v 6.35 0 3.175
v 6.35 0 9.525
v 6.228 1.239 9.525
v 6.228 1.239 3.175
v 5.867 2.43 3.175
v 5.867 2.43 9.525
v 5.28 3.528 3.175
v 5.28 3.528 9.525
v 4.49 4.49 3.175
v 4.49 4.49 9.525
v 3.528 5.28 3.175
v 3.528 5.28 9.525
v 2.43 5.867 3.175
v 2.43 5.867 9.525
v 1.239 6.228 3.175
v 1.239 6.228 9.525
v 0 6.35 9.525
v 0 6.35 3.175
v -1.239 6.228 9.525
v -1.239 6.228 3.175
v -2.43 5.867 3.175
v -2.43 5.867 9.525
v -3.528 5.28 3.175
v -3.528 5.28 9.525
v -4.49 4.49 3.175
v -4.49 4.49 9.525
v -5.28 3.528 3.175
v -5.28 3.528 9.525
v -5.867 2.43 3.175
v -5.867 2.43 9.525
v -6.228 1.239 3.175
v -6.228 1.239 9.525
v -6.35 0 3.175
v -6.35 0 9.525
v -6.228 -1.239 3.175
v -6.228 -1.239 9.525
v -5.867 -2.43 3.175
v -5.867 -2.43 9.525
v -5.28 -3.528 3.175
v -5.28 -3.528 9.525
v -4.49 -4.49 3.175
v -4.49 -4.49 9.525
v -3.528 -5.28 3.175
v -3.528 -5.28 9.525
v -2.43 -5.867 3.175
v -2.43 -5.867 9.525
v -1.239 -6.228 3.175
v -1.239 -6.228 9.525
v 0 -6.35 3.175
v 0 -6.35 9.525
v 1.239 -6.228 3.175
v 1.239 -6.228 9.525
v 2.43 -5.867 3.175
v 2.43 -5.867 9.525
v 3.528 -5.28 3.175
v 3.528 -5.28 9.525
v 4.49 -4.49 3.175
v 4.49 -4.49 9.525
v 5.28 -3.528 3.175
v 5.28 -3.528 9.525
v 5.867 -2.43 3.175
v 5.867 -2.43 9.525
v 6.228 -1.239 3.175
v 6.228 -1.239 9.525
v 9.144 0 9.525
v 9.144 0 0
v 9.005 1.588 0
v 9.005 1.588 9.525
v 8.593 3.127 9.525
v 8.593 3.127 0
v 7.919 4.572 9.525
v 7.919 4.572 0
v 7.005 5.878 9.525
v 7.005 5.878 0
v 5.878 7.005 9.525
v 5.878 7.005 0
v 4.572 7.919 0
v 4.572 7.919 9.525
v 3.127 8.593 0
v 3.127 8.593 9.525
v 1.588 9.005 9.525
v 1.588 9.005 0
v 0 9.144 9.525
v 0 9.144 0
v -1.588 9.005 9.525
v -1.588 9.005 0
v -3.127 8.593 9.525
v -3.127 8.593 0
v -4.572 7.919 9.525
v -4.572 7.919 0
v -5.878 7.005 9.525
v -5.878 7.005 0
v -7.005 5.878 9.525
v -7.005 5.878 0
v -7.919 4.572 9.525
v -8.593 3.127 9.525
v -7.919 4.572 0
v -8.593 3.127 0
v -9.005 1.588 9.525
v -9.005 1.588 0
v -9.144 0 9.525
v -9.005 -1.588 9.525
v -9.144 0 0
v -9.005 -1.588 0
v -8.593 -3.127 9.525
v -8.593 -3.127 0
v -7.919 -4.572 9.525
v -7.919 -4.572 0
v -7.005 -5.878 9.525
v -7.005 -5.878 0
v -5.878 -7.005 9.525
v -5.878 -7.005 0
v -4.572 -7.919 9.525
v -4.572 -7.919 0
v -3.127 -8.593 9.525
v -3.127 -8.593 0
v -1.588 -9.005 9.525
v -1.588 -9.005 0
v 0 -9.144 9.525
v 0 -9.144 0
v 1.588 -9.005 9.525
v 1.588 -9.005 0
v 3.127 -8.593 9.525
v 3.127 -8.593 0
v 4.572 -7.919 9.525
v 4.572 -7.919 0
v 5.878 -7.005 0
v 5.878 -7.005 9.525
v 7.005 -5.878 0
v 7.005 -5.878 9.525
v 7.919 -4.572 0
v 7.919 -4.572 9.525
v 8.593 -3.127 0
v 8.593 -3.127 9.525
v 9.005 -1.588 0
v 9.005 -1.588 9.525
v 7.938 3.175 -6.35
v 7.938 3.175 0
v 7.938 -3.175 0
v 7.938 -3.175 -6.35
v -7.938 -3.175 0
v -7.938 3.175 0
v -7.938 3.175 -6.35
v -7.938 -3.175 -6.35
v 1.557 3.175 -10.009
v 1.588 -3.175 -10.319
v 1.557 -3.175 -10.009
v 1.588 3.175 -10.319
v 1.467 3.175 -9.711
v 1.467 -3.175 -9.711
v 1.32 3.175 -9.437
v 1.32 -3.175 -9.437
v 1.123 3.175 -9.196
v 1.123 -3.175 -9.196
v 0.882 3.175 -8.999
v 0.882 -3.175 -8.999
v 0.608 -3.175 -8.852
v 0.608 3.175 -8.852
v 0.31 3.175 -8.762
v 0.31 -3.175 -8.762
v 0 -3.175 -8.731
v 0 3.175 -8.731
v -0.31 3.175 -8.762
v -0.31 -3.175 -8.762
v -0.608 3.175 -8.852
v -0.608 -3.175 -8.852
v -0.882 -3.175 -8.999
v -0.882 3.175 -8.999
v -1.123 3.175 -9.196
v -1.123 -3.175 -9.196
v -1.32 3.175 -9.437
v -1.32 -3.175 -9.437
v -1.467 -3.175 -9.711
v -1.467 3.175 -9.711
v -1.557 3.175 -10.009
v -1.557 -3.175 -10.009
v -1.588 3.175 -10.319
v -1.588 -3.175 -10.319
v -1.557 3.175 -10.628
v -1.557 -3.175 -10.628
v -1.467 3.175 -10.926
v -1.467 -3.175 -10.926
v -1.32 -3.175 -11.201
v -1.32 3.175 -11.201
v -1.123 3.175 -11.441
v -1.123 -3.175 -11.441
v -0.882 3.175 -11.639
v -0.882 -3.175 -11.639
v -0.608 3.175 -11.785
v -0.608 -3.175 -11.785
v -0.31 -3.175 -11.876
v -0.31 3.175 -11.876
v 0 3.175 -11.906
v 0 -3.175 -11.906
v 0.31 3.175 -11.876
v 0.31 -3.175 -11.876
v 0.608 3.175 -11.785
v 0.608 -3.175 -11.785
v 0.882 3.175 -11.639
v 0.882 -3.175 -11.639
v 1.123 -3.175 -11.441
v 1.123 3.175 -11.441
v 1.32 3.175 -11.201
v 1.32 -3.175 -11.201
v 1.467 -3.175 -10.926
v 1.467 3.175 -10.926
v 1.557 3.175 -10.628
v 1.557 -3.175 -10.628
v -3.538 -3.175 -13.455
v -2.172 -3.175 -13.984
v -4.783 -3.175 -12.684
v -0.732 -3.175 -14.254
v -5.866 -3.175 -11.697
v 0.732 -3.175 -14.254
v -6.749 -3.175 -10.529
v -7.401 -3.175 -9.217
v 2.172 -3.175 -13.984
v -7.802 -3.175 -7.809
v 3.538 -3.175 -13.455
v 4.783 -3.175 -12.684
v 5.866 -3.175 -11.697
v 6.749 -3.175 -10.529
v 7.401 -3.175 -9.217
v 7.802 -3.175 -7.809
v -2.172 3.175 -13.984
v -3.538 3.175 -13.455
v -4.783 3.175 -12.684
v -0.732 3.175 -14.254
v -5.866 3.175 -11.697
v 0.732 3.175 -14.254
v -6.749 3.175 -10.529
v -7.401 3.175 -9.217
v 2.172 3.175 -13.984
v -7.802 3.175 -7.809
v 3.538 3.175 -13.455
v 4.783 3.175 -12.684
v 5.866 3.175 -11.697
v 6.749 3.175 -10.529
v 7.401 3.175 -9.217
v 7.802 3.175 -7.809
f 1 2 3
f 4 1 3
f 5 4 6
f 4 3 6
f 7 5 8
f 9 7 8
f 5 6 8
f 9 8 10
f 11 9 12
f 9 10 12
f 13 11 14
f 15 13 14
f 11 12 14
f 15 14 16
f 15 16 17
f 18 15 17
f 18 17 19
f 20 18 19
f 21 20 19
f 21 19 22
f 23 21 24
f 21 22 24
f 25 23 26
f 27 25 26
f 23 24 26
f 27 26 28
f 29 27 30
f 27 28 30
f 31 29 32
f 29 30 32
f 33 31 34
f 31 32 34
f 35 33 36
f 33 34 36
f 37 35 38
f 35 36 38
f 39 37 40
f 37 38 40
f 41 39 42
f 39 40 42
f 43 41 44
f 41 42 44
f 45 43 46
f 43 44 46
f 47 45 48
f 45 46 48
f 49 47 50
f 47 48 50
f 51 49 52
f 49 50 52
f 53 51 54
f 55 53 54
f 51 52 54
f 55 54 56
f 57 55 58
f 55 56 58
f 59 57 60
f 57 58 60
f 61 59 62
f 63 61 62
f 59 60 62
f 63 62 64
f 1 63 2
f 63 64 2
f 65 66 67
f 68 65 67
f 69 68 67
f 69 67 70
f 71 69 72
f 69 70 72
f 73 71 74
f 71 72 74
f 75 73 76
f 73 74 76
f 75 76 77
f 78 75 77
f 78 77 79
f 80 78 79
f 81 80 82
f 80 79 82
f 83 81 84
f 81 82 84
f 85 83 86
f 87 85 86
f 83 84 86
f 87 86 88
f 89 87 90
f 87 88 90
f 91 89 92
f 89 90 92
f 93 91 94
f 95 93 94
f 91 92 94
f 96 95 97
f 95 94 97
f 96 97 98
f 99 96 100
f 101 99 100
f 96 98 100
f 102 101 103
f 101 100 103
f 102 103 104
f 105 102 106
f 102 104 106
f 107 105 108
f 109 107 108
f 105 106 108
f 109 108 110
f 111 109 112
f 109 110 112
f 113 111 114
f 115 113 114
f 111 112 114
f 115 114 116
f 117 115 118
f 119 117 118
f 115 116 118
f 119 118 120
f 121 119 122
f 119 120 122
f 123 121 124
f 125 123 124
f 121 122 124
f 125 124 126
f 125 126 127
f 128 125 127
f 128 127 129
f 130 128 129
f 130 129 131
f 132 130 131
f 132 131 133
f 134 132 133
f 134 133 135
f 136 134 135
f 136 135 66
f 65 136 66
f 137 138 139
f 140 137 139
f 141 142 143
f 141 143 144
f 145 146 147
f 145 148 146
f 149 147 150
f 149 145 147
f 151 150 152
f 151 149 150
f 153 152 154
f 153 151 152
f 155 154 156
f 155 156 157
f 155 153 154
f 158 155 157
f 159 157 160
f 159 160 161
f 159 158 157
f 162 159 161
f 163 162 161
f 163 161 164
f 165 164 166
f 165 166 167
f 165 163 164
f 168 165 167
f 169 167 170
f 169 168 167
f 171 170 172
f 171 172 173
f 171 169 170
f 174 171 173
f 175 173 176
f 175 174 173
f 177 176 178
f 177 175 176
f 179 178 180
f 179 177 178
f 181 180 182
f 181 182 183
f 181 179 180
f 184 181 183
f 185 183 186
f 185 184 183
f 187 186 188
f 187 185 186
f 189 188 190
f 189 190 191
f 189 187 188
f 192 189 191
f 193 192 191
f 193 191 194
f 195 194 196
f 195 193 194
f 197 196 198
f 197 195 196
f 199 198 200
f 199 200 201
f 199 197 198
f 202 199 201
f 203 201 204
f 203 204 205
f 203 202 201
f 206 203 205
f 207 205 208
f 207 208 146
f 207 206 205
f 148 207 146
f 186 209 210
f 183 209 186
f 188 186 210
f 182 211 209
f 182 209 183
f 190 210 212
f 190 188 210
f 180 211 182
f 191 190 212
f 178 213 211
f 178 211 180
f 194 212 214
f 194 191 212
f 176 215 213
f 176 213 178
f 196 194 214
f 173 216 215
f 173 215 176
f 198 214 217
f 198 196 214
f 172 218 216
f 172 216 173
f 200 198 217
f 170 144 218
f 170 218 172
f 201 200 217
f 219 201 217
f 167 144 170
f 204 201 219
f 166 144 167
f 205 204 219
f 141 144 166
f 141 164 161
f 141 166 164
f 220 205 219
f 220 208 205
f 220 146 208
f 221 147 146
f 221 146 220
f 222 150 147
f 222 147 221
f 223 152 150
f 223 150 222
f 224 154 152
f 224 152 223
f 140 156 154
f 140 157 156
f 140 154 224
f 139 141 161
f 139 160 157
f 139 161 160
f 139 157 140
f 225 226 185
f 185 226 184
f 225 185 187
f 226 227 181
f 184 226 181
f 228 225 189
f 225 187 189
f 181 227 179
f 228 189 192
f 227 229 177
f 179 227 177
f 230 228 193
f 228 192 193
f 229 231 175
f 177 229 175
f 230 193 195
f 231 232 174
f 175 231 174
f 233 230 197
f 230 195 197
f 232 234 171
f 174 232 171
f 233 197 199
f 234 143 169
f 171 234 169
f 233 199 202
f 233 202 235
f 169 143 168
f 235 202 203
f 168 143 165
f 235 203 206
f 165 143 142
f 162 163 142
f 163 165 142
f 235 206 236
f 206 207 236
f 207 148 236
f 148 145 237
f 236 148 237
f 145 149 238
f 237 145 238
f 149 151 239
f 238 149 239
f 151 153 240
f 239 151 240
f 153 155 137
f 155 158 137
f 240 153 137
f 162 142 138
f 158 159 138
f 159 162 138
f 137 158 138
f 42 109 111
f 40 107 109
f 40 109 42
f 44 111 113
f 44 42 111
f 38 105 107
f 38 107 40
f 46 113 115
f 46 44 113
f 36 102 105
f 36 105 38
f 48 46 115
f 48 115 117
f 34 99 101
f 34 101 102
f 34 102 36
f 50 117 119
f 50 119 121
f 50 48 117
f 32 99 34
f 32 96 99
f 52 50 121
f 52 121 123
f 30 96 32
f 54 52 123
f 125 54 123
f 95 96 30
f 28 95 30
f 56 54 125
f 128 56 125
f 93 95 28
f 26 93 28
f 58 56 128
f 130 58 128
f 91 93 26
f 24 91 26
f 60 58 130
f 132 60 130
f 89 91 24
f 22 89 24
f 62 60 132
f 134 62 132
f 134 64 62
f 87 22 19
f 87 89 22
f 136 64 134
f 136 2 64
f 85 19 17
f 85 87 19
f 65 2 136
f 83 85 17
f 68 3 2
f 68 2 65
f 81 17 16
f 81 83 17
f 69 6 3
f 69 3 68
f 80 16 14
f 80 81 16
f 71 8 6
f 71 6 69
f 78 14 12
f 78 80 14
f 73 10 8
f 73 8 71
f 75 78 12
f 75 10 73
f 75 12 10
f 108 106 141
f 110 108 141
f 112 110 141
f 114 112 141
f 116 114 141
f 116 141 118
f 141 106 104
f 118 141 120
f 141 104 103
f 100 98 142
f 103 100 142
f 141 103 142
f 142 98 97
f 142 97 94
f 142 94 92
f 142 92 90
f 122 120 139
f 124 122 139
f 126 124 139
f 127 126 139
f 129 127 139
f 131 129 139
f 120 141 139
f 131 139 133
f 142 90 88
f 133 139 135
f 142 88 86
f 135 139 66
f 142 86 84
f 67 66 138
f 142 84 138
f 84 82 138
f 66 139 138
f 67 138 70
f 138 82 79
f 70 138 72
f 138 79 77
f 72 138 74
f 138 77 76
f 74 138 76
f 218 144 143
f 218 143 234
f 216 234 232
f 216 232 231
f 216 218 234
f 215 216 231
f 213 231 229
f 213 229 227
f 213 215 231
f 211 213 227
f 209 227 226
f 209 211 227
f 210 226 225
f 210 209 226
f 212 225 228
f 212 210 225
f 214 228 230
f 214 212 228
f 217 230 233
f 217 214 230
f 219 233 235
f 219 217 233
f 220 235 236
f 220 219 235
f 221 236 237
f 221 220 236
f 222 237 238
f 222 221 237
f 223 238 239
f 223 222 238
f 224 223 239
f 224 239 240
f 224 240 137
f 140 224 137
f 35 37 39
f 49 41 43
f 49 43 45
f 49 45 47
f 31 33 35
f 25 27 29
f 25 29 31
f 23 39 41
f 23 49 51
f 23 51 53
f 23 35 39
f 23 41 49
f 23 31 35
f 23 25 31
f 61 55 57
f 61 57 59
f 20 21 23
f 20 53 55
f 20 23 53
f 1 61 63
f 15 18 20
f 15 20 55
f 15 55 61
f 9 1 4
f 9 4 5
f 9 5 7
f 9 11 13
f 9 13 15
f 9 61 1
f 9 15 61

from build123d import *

# Parameters (mm, degrees)
F0_R     = 9.144
F1_DEPTH = 9.525
F2_R     = 6.35
F3_DEPTH = 6.35
F4_W     = 15.875
F4_H     = 6.35
F5_DEPTH = 6.35
F6_R     = 1.5875
F7_DEPTH = 3.175


with BuildPart() as f1:
    # F0 (on Top) → F1 (new body)
    with BuildSketch(Plane.XY):
        Circle(F0_R)
    extrude(amount=F1_DEPTH)

    # F2 (on face) → F3 (cut)
    with BuildSketch(Plane.XY.offset(9.525)):
        Circle(F2_R)
    extrude(amount=-F3_DEPTH, mode=Mode.SUBTRACT)

    # F4 (on face) → F5 (join)
    with BuildSketch(Plane(origin=(0, 0, 0), x_dir=(1, 0, 0), z_dir=(0, 0, -1))):
        Rectangle(F4_W, F4_H)
    extrude(amount=F5_DEPTH)

    # F6 (on Front) → F7 (join, symmetric)
    with BuildSketch(Plane.XZ):
        with BuildLine():
            Line((7.9375, -6.35), (-7.9375, -6.35))
            ThreePointArc((-7.9375, -6.35), (0, -14.2875), (7.9375, -6.35))
        make_face()
        with Locations((0, -10.31875)):
            Circle(F6_R, mode=Mode.SUBTRACT)
    extrude(amount=F7_DEPTH, both=True)


solid = f1.part
